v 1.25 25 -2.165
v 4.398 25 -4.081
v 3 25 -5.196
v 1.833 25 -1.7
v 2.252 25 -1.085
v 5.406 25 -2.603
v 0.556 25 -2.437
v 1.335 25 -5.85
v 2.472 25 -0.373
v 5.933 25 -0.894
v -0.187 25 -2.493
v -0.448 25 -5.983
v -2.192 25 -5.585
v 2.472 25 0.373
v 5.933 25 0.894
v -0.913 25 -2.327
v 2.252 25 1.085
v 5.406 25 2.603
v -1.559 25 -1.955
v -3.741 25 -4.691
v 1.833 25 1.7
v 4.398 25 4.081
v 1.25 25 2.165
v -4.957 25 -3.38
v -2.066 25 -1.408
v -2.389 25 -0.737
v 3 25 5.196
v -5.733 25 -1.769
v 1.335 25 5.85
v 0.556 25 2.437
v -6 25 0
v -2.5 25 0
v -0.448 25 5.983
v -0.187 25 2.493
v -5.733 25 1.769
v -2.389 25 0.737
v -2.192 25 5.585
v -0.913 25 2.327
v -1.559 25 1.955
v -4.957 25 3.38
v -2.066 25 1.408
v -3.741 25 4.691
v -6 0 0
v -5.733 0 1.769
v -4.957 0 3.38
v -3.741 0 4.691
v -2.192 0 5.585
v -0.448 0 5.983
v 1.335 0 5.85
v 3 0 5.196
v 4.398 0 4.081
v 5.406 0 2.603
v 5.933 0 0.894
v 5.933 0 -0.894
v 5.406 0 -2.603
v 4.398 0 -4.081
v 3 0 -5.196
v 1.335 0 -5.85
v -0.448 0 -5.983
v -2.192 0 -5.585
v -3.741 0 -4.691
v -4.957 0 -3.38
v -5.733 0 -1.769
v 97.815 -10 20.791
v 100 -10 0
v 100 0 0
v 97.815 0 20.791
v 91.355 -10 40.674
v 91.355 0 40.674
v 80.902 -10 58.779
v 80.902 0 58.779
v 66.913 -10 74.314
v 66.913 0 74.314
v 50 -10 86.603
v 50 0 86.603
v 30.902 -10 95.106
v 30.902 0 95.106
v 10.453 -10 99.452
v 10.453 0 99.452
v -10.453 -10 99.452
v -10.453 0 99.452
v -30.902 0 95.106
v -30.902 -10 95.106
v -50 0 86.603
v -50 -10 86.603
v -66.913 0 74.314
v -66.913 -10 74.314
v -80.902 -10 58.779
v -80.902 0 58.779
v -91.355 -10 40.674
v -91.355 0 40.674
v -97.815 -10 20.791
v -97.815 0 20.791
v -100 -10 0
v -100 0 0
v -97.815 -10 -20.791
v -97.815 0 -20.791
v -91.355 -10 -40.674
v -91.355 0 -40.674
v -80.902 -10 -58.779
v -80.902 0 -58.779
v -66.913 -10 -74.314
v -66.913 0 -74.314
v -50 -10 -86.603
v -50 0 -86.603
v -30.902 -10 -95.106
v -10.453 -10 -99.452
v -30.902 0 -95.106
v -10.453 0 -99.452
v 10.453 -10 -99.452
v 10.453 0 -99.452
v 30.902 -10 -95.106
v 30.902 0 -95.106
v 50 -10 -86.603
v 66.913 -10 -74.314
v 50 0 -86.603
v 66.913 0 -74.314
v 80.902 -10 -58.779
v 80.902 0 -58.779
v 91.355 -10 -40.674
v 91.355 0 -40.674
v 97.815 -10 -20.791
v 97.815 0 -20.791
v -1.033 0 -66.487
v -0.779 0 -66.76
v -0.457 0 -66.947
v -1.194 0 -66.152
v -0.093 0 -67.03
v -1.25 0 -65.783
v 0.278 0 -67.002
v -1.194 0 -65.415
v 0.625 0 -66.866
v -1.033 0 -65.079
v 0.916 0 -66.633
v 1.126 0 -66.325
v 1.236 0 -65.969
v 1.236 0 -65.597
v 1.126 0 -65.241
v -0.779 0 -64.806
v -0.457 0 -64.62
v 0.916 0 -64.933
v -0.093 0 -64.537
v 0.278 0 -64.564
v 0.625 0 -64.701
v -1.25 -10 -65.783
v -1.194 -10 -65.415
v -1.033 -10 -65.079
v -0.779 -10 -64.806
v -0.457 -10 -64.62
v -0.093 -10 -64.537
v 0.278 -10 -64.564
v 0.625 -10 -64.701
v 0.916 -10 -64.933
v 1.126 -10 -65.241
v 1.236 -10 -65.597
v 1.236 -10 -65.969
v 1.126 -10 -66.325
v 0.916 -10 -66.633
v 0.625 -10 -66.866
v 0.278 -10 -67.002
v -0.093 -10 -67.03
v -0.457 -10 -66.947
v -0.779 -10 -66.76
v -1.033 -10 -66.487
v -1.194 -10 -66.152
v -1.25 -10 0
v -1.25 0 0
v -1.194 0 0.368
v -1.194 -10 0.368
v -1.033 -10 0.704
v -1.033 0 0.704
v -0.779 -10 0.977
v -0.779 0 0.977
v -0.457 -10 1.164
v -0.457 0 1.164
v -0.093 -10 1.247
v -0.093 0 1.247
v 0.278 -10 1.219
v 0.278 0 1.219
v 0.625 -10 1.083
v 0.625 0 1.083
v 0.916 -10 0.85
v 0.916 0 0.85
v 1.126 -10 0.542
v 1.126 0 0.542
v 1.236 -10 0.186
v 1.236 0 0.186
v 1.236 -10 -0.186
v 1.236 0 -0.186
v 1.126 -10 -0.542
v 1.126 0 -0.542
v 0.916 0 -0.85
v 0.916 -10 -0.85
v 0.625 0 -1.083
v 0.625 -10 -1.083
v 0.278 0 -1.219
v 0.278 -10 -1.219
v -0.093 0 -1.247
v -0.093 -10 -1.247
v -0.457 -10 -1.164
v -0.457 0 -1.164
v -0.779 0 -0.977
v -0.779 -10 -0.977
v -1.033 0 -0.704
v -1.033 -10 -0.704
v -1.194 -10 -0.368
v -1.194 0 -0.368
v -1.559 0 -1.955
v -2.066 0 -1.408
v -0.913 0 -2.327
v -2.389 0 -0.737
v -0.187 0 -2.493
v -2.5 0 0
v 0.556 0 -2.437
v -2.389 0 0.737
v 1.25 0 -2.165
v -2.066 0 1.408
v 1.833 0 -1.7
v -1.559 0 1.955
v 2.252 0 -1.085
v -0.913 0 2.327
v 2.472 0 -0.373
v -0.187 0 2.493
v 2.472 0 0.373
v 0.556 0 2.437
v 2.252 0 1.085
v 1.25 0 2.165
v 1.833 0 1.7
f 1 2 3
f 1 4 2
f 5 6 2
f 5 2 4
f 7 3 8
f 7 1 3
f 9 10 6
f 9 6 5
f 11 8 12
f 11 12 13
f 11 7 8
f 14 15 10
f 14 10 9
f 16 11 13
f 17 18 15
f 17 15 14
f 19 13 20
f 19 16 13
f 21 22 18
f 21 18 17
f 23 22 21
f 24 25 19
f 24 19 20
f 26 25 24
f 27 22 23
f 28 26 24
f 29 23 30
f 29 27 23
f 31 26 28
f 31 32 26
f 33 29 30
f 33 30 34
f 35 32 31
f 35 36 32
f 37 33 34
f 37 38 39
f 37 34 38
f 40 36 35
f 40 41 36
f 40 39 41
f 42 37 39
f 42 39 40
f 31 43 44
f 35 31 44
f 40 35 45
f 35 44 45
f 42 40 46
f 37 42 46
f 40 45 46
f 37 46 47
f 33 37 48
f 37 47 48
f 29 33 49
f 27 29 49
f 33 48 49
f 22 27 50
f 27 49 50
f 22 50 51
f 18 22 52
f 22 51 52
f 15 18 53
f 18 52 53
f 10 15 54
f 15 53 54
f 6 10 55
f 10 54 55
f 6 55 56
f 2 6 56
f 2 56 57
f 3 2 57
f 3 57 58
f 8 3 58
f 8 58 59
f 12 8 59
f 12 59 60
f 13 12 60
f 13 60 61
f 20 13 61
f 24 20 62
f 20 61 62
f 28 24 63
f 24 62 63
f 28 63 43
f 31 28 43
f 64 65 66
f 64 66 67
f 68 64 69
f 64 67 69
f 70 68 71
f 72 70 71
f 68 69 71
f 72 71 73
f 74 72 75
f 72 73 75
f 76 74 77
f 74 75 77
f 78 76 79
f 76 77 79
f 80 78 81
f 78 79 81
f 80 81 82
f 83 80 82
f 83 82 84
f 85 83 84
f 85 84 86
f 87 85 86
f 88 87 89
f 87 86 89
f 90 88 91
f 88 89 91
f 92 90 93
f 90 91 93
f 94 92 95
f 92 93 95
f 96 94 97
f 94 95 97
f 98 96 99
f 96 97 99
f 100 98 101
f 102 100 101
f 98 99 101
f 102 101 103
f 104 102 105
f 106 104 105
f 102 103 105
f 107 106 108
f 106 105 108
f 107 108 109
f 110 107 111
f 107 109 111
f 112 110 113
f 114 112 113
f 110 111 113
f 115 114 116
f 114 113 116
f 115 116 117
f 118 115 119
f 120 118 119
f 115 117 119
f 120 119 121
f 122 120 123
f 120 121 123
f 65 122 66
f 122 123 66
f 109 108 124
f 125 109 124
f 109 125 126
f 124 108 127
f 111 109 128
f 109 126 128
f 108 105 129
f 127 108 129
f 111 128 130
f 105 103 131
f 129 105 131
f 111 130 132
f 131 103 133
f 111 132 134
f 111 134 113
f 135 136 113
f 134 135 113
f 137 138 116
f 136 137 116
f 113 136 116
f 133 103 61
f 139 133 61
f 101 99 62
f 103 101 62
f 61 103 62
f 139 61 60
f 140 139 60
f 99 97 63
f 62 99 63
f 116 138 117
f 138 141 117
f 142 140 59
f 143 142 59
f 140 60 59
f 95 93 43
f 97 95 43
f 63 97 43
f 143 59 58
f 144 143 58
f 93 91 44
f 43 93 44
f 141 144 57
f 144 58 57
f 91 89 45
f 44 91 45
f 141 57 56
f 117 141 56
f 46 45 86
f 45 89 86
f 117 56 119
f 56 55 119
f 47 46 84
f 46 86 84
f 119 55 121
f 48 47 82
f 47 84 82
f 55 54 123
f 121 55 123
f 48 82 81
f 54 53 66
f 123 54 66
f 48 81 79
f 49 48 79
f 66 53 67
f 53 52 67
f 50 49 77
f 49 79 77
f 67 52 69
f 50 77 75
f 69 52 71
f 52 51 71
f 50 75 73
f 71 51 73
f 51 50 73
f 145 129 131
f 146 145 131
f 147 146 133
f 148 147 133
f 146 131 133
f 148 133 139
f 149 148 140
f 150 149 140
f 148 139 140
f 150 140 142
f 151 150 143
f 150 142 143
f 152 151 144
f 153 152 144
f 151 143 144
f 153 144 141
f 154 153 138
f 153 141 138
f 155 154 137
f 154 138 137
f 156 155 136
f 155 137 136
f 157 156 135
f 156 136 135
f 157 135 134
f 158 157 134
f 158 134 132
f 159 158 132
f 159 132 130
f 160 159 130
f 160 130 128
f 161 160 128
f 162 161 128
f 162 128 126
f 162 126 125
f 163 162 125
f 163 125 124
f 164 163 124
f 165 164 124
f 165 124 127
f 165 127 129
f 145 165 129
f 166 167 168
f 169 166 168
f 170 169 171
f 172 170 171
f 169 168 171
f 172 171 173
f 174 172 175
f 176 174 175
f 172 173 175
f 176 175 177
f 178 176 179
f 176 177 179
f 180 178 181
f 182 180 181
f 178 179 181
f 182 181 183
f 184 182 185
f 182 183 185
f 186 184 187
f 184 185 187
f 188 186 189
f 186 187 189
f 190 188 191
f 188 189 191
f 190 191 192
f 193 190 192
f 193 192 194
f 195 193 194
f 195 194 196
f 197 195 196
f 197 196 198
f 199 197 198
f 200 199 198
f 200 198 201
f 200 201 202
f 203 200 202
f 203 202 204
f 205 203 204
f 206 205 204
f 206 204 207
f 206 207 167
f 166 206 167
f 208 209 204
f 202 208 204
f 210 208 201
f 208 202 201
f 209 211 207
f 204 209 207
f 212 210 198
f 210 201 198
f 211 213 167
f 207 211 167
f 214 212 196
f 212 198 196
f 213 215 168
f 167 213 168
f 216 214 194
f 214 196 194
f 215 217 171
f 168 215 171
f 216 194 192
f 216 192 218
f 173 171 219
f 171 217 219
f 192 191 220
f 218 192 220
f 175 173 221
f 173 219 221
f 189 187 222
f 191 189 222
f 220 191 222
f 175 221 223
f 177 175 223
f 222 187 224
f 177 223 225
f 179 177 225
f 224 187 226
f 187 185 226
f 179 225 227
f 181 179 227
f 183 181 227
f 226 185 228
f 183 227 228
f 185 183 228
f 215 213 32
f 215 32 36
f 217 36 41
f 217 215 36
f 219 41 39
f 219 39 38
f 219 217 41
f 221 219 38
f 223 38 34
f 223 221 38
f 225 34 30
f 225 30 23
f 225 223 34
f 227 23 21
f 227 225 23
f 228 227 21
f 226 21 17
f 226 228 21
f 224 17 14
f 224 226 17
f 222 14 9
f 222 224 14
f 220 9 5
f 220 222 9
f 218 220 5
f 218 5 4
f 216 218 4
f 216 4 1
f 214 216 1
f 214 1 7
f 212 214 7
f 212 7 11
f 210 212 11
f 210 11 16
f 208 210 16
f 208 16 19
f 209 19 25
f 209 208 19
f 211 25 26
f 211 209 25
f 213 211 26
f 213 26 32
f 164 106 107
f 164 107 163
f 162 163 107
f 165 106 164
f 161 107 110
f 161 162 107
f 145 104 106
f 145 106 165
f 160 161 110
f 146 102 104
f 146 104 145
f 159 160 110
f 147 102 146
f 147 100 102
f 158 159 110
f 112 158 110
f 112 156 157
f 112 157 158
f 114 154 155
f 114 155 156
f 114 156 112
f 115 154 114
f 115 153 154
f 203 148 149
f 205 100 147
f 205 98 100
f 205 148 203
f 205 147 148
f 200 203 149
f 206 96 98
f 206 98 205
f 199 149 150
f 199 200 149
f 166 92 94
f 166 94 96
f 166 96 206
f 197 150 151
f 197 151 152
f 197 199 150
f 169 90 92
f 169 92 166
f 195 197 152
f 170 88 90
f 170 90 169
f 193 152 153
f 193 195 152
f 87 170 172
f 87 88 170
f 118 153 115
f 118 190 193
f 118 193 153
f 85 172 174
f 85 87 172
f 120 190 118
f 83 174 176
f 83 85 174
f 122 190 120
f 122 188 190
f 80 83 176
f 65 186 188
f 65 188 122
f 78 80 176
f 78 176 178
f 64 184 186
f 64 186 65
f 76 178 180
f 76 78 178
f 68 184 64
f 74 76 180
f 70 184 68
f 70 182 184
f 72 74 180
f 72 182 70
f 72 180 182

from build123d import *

# Parameters (mm, degrees)
F0_R     = 100
F1_DEPTH = 10
F3_R     = 6
F3_R_2   = 2.5
F4_DEPTH = 25
F5_D     = 2.5


with BuildPart() as f1:
    # F0 (on Front) → F1 (new body)
    with BuildSketch(Plane.XZ):
        Circle(F0_R)
    extrude(amount=F1_DEPTH)

    # F3 (on face) → F4 (join)
    with BuildSketch(Plane(origin=(0, 0, 0), x_dir=(-1, 0, 0), z_dir=(0, 1, 0))):
        Circle(F3_R)
        Circle(F3_R_2, mode=Mode.SUBTRACT)
    extrude(amount=F4_DEPTH)

    # F5 (through all)
    with Locations(Plane.XZ.offset(10)):
        with Locations((0, 0), (0, -65.783132)):
            Hole(F5_D / 2)


solid = f1.part
